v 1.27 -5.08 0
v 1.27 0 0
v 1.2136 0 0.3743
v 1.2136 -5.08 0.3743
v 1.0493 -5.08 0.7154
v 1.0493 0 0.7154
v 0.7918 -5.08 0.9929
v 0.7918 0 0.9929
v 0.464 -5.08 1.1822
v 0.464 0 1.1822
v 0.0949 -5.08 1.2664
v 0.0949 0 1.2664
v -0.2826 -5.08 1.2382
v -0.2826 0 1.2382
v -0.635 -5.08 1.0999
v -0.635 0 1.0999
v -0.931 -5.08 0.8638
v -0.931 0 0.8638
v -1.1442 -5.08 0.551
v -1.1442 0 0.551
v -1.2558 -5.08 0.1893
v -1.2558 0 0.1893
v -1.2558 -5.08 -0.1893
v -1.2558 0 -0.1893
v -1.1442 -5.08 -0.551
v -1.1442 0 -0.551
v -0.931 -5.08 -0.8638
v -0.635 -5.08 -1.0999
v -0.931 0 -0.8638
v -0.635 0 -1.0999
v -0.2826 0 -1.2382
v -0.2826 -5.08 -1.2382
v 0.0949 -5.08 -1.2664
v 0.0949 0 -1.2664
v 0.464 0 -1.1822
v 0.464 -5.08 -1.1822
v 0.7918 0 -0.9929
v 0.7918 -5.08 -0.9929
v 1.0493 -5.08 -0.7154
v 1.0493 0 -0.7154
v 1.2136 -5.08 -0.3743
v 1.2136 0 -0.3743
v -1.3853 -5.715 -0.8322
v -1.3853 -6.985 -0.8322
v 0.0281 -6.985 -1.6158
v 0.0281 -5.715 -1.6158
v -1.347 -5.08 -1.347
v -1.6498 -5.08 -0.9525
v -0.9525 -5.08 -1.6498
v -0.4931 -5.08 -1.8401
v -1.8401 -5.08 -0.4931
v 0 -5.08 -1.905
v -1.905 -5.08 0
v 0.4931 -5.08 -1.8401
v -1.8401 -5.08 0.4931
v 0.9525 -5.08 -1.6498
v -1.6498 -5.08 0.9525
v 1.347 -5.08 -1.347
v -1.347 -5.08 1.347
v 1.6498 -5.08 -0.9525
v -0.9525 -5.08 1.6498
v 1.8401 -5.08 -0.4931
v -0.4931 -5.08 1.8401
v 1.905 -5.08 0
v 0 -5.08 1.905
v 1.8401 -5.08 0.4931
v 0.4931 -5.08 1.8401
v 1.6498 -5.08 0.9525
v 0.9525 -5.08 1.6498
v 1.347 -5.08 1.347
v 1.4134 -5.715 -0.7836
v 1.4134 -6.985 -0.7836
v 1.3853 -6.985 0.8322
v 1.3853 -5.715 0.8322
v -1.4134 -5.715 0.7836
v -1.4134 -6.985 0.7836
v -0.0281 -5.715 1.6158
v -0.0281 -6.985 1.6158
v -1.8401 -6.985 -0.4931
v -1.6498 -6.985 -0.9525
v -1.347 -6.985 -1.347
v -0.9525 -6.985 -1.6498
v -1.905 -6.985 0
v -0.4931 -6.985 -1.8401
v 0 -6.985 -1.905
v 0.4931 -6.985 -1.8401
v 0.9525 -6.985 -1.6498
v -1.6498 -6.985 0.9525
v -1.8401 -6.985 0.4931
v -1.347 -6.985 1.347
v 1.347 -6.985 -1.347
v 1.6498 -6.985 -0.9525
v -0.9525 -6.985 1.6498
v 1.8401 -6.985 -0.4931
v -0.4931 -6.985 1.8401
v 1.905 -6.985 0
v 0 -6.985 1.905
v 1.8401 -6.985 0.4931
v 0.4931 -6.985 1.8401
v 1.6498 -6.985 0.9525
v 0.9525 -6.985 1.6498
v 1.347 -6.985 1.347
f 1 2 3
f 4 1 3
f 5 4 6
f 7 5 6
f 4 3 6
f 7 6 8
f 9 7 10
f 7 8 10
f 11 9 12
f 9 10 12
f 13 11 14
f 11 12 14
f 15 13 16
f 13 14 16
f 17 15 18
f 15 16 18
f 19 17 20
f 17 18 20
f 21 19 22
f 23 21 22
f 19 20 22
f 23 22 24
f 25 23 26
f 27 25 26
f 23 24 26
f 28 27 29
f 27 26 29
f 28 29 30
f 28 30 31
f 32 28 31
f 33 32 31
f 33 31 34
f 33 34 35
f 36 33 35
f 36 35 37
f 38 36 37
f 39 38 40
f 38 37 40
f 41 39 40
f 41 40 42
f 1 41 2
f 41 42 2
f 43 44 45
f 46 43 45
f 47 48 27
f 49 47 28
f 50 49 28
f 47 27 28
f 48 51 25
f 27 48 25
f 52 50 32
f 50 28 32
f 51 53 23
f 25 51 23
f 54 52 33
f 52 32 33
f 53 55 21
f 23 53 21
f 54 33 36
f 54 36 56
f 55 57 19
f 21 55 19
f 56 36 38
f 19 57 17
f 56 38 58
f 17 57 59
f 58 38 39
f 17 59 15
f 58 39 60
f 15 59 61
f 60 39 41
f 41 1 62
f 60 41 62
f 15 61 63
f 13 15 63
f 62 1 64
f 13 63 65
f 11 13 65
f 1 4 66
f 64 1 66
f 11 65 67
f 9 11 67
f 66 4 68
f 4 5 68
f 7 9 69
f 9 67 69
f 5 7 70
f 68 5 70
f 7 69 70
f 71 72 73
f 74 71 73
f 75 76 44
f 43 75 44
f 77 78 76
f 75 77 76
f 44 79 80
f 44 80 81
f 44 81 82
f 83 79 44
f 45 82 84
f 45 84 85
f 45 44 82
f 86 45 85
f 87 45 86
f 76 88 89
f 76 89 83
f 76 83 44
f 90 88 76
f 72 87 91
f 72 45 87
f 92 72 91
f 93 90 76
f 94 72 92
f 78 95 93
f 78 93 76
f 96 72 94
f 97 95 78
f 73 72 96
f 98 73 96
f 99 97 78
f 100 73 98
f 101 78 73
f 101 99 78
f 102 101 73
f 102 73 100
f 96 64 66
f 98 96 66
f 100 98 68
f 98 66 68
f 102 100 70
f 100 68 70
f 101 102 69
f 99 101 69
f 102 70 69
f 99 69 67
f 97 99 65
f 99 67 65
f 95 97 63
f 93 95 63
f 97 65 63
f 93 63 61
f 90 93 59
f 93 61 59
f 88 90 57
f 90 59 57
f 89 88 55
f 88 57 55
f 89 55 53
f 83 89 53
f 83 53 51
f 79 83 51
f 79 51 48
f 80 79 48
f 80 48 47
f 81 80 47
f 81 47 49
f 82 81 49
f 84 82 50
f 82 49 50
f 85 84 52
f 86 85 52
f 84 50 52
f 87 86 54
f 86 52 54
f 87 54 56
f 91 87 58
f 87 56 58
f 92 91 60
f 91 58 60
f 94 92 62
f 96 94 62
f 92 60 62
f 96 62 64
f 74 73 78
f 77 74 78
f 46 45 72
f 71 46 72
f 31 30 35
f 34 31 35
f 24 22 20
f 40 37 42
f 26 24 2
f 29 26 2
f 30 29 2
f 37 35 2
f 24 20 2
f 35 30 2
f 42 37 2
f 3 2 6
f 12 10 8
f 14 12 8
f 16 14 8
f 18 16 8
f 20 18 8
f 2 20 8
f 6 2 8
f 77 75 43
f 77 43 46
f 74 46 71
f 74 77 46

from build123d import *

# Parameters (mm, degrees)
F0_R     = 1.27
F1_DEPTH = 5.08
F2_R     = 1.905
F2_R_2   = 1.27
F3_DEPTH = 1.905
F5_DEPTH = 1.27


with BuildPart() as f1:
    # F0 (on Front) → F1 (new body)
    with BuildSketch(Plane.XZ):
        Circle(F0_R)
    extrude(amount=F1_DEPTH)

    # F2 (on face) → F3 (join)
    with BuildSketch(Plane.XZ.offset(5.08)):
        Circle(F2_R)
        Circle(F2_R_2, mode=Mode.SUBTRACT)
        Circle(F2_R_2)
    extrude(amount=F3_DEPTH)

    # F4 (on face) → F5 (cut)
    with BuildSketch(Plane.XZ.offset(6.985)):
        Polygon((1.385297, 0.832218), (-0.028074, 1.615811), (-1.413371, 0.783593), (-1.385297, -0.832218), (0.028074, -1.615811), (1.413371, -0.783593), align=None)
    extrude(amount=-F5_DEPTH, mode=Mode.SUBTRACT)


solid = f1.part
